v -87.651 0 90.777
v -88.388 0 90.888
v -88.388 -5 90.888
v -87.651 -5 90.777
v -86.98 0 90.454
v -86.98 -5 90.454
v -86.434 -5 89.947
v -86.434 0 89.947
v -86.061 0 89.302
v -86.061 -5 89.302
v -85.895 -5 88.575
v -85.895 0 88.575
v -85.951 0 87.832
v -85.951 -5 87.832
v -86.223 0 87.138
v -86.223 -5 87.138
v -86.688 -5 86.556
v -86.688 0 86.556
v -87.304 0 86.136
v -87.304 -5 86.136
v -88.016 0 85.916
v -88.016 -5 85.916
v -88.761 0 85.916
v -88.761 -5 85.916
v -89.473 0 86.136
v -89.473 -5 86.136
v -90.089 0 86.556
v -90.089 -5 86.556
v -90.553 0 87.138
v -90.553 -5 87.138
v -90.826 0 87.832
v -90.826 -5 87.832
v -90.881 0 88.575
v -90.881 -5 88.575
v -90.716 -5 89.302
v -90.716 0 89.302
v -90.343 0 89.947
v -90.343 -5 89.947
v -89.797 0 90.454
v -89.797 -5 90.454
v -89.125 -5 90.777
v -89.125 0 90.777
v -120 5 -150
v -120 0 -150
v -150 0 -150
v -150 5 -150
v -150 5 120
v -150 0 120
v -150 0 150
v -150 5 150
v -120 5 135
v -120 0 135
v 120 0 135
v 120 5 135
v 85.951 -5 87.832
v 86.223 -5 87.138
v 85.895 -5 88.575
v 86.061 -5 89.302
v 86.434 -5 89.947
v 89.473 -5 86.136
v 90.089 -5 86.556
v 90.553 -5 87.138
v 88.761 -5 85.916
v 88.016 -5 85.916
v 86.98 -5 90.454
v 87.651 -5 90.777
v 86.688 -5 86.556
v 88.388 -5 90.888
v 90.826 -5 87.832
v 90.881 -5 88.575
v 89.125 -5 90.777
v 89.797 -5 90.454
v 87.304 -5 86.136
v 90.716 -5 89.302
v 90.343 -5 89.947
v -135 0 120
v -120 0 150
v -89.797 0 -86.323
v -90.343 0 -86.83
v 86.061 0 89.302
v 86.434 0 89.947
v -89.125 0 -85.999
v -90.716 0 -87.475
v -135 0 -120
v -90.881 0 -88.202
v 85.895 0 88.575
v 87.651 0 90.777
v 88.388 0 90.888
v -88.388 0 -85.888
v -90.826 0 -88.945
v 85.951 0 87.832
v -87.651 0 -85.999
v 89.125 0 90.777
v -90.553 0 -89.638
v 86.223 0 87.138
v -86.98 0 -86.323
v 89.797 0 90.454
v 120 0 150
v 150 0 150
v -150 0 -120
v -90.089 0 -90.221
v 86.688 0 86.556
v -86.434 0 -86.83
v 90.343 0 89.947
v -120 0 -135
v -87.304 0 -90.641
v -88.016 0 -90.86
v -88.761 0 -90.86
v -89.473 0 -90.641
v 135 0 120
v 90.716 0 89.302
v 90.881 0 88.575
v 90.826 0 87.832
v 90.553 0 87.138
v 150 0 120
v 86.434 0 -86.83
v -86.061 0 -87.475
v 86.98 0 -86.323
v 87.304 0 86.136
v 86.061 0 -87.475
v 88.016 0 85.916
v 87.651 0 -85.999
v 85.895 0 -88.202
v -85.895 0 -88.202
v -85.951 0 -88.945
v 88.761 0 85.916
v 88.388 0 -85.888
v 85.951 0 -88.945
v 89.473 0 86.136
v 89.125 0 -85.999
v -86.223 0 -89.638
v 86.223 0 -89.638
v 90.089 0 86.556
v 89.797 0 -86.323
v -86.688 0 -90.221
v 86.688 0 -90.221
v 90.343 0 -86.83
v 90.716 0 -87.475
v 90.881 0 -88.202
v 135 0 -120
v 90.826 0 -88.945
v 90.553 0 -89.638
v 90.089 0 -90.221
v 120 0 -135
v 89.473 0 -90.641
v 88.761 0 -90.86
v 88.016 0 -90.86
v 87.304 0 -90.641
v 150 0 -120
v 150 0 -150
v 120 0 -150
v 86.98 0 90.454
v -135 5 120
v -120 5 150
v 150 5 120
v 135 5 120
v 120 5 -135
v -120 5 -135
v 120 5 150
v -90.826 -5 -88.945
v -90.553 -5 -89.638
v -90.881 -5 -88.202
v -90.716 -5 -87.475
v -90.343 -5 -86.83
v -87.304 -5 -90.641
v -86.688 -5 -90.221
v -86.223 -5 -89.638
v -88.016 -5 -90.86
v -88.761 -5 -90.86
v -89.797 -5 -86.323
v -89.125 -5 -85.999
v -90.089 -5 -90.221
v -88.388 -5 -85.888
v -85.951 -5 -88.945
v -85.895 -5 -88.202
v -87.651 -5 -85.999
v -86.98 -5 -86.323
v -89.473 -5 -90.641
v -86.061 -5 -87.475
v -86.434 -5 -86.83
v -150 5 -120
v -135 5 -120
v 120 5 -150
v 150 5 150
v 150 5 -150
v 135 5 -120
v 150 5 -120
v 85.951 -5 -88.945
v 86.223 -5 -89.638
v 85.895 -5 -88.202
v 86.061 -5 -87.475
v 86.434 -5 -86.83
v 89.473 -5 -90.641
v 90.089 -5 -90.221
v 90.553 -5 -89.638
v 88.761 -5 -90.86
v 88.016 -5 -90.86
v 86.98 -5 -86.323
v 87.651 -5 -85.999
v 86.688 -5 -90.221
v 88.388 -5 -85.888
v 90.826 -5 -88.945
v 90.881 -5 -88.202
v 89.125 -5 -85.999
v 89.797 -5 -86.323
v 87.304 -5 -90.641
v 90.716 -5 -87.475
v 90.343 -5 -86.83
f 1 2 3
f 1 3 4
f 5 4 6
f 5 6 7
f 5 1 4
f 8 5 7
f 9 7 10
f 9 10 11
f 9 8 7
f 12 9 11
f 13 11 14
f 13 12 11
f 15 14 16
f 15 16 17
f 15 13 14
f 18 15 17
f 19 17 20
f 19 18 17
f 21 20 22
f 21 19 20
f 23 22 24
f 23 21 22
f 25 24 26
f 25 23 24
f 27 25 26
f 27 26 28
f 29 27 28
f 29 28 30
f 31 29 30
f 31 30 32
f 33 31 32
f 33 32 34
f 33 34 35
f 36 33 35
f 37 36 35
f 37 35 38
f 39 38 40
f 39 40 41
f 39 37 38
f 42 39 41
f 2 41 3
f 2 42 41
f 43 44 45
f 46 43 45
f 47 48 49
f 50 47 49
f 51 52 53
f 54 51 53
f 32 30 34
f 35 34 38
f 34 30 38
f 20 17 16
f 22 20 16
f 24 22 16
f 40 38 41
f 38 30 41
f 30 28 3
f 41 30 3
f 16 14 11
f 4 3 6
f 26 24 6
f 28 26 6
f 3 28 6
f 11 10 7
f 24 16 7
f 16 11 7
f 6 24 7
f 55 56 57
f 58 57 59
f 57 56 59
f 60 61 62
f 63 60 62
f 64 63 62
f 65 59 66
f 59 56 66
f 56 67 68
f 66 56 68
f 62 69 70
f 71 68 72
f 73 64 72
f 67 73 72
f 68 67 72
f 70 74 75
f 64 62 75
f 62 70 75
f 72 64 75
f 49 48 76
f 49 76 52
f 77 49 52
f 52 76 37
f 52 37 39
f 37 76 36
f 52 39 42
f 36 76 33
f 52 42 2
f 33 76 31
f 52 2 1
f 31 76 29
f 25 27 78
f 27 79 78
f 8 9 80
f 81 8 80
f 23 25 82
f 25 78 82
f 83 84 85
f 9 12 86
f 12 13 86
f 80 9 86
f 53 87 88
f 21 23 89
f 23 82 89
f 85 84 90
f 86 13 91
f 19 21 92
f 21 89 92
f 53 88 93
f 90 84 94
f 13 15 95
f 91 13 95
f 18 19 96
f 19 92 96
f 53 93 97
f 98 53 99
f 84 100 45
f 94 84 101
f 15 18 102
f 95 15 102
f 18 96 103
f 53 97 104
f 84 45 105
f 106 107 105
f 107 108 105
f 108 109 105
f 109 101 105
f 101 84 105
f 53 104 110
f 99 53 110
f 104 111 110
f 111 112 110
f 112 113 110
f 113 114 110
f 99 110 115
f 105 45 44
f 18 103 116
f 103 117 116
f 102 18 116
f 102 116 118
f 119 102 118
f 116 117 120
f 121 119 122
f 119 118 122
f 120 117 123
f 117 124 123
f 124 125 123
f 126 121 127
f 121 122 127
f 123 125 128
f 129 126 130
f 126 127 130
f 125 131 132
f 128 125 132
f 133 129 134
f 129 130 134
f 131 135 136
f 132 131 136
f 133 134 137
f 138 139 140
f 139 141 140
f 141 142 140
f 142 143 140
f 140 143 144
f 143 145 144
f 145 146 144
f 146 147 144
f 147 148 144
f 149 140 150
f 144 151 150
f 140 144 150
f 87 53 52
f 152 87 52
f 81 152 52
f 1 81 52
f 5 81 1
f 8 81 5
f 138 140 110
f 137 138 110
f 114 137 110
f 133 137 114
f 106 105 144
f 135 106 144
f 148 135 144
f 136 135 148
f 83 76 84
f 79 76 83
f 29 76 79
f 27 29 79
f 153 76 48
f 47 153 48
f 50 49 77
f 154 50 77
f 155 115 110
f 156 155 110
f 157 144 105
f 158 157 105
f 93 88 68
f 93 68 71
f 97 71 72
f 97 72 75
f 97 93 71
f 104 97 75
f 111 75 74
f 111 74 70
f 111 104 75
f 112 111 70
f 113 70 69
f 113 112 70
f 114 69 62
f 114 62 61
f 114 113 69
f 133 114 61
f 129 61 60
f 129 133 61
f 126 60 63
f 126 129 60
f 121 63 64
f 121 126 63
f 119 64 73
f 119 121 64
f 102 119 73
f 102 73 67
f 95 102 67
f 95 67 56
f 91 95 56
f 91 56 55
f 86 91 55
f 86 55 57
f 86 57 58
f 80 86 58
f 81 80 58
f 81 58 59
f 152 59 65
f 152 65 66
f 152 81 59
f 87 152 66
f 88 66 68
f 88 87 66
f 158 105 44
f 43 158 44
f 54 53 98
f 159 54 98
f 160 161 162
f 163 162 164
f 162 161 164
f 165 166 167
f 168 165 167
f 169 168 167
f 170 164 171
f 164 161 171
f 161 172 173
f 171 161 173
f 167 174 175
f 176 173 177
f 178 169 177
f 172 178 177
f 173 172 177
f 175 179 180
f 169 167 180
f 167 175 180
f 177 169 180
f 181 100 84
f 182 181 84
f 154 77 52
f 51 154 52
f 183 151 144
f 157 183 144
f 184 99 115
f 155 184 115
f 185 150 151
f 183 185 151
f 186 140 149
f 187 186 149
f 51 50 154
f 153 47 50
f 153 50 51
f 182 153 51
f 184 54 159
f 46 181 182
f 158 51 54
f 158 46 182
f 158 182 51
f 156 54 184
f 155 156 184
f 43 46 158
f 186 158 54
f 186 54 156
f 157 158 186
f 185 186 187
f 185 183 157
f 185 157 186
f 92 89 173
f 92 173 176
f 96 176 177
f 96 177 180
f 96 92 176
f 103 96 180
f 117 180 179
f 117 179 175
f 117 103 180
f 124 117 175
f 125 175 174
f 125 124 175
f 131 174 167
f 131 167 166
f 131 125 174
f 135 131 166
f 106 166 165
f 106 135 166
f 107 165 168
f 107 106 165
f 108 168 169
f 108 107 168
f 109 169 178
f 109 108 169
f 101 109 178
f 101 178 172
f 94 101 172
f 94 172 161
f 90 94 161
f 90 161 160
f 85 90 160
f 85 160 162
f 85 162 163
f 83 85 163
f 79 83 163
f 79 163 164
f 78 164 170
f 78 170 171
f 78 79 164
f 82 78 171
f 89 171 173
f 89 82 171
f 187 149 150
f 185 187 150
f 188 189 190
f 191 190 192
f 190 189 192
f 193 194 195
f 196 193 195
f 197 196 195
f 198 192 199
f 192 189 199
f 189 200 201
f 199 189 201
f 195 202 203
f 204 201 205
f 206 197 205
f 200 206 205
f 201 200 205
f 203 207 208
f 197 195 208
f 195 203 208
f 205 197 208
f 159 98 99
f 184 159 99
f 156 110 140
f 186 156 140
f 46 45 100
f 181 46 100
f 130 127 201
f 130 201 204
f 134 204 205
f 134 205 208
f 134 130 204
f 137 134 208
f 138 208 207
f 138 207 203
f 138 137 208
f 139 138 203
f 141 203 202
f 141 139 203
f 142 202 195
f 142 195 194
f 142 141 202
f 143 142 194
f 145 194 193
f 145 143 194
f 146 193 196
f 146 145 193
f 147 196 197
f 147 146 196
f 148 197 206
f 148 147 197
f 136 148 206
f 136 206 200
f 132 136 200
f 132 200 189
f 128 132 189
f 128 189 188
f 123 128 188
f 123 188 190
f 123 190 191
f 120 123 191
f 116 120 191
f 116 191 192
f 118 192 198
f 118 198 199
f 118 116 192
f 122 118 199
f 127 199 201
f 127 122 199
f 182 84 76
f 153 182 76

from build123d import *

# Parameters (mm, degrees)
EXTRUDE_1_DEPTH = 5
SKETCH_3_R      = 2.5
EXTRUDE_2_DEPTH = 5


with BuildPart() as part:
    # 草图2 → 凸台-拉伸1 (new body)
    with BuildSketch(Plane(origin=(0, 0, 0), x_dir=(1, 0, 0), z_dir=(0, 1, 0))):
        Polygon((-120, -150), (-120, -135), (120, -135), (120, -150), (150, -150), (150, -120), (135, -120), (135, 120), (150, 120), (150, 150), (120, 150), (120, 135), (-120, 135), (-120, 150), (-150, 150), (-150, 120), (-135, 120), (-135, -120), (-150, -120), (-150, -150), align=None)
    extrude(amount=EXTRUDE_1_DEPTH)

    # 草图3 → 凸台-拉伸2 (add)
    with BuildSketch(Plane(origin=(0, 0, 0), x_dir=(1, 0, 0), z_dir=(0, 1, 0))):
        with Locations(Location((-88.388347648, 88.388347648, 0), (0, 0, 270))):
            Circle(SKETCH_3_R)
        with Locations(Location((88.388347648, 88.388347648, 0), (0, 0, 270))):
            Circle(SKETCH_3_R)
        with Locations(Location((-88.388347648, -88.388347648, 0), (0, 0, 270))):
            Circle(SKETCH_3_R)
        with Locations(Location((88.388347648, -88.388347648, 0), (0, 0, 270))):
            Circle(SKETCH_3_R)
    extrude(amount=-EXTRUDE_2_DEPTH)


solid = part.part
